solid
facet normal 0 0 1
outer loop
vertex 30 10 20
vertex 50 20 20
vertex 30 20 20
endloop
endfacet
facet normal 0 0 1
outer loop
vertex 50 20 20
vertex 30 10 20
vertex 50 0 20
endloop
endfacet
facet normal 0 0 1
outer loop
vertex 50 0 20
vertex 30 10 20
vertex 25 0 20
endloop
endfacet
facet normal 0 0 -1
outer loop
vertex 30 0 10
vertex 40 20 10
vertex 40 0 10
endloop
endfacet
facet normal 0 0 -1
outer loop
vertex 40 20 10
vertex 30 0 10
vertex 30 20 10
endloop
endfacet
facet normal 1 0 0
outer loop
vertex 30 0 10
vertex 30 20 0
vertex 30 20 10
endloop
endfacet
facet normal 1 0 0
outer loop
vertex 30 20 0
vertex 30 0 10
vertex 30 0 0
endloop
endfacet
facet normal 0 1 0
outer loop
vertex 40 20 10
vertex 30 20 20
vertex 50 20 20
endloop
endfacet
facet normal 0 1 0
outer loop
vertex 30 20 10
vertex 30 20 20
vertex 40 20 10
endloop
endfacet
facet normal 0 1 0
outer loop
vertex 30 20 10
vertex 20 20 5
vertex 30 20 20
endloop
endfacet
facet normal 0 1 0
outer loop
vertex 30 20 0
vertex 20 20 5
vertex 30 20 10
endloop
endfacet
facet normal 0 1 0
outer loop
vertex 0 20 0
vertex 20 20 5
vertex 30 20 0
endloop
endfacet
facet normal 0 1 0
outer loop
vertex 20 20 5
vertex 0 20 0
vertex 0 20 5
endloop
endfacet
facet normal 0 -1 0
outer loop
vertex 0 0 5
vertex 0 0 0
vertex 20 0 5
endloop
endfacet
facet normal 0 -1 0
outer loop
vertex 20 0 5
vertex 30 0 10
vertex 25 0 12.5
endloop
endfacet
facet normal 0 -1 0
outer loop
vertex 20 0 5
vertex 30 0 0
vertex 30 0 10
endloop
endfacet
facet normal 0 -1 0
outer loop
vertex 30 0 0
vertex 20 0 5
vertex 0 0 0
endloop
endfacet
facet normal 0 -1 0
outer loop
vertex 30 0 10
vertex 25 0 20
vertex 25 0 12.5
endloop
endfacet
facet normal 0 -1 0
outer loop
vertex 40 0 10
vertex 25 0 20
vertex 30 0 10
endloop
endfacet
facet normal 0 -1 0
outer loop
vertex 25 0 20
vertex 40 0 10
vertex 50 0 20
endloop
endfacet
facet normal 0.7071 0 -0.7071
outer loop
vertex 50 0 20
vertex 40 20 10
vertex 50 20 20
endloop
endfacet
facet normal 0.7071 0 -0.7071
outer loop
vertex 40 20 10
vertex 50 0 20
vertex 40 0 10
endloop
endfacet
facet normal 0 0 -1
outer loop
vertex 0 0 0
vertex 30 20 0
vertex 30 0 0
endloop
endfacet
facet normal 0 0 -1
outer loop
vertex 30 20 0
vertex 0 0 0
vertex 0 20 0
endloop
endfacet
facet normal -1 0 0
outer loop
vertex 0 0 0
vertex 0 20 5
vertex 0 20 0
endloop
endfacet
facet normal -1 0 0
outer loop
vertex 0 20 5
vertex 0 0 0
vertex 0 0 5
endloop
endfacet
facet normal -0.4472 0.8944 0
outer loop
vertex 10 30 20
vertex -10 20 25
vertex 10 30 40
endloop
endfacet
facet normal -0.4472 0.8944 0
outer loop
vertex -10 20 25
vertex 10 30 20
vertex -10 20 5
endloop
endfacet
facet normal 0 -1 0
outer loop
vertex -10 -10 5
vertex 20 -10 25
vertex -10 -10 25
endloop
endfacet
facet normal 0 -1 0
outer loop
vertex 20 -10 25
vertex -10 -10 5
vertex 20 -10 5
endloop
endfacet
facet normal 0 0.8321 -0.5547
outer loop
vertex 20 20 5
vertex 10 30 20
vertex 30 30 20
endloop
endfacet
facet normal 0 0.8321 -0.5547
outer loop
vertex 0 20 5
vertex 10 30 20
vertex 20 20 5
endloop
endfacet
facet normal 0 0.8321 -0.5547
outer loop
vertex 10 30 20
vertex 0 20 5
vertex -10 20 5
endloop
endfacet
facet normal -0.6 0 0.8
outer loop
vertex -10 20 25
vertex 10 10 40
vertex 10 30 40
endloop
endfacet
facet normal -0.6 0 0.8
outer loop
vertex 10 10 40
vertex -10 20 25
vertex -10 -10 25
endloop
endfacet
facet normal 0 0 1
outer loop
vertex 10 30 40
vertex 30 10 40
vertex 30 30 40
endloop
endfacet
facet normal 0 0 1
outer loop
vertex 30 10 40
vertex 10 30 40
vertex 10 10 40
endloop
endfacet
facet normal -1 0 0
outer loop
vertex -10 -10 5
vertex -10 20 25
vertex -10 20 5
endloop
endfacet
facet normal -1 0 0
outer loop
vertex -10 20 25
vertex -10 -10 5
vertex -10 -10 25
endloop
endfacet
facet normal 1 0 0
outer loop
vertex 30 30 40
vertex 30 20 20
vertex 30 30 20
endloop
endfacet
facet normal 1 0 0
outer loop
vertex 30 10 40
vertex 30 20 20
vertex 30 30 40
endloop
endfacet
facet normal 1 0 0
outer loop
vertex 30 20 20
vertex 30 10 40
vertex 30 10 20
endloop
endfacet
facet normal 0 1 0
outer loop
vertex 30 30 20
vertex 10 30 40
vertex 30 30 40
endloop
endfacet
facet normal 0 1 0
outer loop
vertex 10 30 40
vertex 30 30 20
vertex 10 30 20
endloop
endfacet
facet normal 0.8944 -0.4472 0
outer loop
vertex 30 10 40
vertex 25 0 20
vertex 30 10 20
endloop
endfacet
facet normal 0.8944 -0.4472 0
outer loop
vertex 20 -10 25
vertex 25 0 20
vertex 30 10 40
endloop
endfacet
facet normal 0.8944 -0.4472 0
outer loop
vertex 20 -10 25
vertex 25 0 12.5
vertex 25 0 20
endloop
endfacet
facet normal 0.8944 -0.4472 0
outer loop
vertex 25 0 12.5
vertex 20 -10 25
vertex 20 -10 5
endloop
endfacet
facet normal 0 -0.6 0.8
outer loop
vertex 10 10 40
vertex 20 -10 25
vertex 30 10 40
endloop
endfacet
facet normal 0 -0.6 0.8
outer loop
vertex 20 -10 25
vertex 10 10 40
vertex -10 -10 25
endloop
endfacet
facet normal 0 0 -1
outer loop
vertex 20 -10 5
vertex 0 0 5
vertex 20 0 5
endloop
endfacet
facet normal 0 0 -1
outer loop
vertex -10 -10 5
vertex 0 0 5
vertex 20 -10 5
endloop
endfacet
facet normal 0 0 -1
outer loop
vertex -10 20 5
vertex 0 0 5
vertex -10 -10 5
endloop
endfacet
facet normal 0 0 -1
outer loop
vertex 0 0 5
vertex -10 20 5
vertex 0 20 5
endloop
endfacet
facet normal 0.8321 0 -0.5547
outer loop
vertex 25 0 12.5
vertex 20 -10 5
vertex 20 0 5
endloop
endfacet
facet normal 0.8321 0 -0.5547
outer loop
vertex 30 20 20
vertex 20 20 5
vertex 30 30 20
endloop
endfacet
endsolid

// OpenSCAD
cube([30, 20, 20]);
translate([30, 0, 10]) {
	cube([10, 20, 10]);
	multmatrix([
			[1, 0, 1, 0],
			[0, 1, 0, 0],
			[0, 0, 1, 0],
			[0, 0, 0, 1]]) {
		cube([10, 20, 10]);
	}
}
hull() {
	translate([-10, -10, 5]) {
		cube([30, 30, 20]);
	}
	translate([10, 10, 20]) {
		cube([20, 20, 20]);
	}
}
